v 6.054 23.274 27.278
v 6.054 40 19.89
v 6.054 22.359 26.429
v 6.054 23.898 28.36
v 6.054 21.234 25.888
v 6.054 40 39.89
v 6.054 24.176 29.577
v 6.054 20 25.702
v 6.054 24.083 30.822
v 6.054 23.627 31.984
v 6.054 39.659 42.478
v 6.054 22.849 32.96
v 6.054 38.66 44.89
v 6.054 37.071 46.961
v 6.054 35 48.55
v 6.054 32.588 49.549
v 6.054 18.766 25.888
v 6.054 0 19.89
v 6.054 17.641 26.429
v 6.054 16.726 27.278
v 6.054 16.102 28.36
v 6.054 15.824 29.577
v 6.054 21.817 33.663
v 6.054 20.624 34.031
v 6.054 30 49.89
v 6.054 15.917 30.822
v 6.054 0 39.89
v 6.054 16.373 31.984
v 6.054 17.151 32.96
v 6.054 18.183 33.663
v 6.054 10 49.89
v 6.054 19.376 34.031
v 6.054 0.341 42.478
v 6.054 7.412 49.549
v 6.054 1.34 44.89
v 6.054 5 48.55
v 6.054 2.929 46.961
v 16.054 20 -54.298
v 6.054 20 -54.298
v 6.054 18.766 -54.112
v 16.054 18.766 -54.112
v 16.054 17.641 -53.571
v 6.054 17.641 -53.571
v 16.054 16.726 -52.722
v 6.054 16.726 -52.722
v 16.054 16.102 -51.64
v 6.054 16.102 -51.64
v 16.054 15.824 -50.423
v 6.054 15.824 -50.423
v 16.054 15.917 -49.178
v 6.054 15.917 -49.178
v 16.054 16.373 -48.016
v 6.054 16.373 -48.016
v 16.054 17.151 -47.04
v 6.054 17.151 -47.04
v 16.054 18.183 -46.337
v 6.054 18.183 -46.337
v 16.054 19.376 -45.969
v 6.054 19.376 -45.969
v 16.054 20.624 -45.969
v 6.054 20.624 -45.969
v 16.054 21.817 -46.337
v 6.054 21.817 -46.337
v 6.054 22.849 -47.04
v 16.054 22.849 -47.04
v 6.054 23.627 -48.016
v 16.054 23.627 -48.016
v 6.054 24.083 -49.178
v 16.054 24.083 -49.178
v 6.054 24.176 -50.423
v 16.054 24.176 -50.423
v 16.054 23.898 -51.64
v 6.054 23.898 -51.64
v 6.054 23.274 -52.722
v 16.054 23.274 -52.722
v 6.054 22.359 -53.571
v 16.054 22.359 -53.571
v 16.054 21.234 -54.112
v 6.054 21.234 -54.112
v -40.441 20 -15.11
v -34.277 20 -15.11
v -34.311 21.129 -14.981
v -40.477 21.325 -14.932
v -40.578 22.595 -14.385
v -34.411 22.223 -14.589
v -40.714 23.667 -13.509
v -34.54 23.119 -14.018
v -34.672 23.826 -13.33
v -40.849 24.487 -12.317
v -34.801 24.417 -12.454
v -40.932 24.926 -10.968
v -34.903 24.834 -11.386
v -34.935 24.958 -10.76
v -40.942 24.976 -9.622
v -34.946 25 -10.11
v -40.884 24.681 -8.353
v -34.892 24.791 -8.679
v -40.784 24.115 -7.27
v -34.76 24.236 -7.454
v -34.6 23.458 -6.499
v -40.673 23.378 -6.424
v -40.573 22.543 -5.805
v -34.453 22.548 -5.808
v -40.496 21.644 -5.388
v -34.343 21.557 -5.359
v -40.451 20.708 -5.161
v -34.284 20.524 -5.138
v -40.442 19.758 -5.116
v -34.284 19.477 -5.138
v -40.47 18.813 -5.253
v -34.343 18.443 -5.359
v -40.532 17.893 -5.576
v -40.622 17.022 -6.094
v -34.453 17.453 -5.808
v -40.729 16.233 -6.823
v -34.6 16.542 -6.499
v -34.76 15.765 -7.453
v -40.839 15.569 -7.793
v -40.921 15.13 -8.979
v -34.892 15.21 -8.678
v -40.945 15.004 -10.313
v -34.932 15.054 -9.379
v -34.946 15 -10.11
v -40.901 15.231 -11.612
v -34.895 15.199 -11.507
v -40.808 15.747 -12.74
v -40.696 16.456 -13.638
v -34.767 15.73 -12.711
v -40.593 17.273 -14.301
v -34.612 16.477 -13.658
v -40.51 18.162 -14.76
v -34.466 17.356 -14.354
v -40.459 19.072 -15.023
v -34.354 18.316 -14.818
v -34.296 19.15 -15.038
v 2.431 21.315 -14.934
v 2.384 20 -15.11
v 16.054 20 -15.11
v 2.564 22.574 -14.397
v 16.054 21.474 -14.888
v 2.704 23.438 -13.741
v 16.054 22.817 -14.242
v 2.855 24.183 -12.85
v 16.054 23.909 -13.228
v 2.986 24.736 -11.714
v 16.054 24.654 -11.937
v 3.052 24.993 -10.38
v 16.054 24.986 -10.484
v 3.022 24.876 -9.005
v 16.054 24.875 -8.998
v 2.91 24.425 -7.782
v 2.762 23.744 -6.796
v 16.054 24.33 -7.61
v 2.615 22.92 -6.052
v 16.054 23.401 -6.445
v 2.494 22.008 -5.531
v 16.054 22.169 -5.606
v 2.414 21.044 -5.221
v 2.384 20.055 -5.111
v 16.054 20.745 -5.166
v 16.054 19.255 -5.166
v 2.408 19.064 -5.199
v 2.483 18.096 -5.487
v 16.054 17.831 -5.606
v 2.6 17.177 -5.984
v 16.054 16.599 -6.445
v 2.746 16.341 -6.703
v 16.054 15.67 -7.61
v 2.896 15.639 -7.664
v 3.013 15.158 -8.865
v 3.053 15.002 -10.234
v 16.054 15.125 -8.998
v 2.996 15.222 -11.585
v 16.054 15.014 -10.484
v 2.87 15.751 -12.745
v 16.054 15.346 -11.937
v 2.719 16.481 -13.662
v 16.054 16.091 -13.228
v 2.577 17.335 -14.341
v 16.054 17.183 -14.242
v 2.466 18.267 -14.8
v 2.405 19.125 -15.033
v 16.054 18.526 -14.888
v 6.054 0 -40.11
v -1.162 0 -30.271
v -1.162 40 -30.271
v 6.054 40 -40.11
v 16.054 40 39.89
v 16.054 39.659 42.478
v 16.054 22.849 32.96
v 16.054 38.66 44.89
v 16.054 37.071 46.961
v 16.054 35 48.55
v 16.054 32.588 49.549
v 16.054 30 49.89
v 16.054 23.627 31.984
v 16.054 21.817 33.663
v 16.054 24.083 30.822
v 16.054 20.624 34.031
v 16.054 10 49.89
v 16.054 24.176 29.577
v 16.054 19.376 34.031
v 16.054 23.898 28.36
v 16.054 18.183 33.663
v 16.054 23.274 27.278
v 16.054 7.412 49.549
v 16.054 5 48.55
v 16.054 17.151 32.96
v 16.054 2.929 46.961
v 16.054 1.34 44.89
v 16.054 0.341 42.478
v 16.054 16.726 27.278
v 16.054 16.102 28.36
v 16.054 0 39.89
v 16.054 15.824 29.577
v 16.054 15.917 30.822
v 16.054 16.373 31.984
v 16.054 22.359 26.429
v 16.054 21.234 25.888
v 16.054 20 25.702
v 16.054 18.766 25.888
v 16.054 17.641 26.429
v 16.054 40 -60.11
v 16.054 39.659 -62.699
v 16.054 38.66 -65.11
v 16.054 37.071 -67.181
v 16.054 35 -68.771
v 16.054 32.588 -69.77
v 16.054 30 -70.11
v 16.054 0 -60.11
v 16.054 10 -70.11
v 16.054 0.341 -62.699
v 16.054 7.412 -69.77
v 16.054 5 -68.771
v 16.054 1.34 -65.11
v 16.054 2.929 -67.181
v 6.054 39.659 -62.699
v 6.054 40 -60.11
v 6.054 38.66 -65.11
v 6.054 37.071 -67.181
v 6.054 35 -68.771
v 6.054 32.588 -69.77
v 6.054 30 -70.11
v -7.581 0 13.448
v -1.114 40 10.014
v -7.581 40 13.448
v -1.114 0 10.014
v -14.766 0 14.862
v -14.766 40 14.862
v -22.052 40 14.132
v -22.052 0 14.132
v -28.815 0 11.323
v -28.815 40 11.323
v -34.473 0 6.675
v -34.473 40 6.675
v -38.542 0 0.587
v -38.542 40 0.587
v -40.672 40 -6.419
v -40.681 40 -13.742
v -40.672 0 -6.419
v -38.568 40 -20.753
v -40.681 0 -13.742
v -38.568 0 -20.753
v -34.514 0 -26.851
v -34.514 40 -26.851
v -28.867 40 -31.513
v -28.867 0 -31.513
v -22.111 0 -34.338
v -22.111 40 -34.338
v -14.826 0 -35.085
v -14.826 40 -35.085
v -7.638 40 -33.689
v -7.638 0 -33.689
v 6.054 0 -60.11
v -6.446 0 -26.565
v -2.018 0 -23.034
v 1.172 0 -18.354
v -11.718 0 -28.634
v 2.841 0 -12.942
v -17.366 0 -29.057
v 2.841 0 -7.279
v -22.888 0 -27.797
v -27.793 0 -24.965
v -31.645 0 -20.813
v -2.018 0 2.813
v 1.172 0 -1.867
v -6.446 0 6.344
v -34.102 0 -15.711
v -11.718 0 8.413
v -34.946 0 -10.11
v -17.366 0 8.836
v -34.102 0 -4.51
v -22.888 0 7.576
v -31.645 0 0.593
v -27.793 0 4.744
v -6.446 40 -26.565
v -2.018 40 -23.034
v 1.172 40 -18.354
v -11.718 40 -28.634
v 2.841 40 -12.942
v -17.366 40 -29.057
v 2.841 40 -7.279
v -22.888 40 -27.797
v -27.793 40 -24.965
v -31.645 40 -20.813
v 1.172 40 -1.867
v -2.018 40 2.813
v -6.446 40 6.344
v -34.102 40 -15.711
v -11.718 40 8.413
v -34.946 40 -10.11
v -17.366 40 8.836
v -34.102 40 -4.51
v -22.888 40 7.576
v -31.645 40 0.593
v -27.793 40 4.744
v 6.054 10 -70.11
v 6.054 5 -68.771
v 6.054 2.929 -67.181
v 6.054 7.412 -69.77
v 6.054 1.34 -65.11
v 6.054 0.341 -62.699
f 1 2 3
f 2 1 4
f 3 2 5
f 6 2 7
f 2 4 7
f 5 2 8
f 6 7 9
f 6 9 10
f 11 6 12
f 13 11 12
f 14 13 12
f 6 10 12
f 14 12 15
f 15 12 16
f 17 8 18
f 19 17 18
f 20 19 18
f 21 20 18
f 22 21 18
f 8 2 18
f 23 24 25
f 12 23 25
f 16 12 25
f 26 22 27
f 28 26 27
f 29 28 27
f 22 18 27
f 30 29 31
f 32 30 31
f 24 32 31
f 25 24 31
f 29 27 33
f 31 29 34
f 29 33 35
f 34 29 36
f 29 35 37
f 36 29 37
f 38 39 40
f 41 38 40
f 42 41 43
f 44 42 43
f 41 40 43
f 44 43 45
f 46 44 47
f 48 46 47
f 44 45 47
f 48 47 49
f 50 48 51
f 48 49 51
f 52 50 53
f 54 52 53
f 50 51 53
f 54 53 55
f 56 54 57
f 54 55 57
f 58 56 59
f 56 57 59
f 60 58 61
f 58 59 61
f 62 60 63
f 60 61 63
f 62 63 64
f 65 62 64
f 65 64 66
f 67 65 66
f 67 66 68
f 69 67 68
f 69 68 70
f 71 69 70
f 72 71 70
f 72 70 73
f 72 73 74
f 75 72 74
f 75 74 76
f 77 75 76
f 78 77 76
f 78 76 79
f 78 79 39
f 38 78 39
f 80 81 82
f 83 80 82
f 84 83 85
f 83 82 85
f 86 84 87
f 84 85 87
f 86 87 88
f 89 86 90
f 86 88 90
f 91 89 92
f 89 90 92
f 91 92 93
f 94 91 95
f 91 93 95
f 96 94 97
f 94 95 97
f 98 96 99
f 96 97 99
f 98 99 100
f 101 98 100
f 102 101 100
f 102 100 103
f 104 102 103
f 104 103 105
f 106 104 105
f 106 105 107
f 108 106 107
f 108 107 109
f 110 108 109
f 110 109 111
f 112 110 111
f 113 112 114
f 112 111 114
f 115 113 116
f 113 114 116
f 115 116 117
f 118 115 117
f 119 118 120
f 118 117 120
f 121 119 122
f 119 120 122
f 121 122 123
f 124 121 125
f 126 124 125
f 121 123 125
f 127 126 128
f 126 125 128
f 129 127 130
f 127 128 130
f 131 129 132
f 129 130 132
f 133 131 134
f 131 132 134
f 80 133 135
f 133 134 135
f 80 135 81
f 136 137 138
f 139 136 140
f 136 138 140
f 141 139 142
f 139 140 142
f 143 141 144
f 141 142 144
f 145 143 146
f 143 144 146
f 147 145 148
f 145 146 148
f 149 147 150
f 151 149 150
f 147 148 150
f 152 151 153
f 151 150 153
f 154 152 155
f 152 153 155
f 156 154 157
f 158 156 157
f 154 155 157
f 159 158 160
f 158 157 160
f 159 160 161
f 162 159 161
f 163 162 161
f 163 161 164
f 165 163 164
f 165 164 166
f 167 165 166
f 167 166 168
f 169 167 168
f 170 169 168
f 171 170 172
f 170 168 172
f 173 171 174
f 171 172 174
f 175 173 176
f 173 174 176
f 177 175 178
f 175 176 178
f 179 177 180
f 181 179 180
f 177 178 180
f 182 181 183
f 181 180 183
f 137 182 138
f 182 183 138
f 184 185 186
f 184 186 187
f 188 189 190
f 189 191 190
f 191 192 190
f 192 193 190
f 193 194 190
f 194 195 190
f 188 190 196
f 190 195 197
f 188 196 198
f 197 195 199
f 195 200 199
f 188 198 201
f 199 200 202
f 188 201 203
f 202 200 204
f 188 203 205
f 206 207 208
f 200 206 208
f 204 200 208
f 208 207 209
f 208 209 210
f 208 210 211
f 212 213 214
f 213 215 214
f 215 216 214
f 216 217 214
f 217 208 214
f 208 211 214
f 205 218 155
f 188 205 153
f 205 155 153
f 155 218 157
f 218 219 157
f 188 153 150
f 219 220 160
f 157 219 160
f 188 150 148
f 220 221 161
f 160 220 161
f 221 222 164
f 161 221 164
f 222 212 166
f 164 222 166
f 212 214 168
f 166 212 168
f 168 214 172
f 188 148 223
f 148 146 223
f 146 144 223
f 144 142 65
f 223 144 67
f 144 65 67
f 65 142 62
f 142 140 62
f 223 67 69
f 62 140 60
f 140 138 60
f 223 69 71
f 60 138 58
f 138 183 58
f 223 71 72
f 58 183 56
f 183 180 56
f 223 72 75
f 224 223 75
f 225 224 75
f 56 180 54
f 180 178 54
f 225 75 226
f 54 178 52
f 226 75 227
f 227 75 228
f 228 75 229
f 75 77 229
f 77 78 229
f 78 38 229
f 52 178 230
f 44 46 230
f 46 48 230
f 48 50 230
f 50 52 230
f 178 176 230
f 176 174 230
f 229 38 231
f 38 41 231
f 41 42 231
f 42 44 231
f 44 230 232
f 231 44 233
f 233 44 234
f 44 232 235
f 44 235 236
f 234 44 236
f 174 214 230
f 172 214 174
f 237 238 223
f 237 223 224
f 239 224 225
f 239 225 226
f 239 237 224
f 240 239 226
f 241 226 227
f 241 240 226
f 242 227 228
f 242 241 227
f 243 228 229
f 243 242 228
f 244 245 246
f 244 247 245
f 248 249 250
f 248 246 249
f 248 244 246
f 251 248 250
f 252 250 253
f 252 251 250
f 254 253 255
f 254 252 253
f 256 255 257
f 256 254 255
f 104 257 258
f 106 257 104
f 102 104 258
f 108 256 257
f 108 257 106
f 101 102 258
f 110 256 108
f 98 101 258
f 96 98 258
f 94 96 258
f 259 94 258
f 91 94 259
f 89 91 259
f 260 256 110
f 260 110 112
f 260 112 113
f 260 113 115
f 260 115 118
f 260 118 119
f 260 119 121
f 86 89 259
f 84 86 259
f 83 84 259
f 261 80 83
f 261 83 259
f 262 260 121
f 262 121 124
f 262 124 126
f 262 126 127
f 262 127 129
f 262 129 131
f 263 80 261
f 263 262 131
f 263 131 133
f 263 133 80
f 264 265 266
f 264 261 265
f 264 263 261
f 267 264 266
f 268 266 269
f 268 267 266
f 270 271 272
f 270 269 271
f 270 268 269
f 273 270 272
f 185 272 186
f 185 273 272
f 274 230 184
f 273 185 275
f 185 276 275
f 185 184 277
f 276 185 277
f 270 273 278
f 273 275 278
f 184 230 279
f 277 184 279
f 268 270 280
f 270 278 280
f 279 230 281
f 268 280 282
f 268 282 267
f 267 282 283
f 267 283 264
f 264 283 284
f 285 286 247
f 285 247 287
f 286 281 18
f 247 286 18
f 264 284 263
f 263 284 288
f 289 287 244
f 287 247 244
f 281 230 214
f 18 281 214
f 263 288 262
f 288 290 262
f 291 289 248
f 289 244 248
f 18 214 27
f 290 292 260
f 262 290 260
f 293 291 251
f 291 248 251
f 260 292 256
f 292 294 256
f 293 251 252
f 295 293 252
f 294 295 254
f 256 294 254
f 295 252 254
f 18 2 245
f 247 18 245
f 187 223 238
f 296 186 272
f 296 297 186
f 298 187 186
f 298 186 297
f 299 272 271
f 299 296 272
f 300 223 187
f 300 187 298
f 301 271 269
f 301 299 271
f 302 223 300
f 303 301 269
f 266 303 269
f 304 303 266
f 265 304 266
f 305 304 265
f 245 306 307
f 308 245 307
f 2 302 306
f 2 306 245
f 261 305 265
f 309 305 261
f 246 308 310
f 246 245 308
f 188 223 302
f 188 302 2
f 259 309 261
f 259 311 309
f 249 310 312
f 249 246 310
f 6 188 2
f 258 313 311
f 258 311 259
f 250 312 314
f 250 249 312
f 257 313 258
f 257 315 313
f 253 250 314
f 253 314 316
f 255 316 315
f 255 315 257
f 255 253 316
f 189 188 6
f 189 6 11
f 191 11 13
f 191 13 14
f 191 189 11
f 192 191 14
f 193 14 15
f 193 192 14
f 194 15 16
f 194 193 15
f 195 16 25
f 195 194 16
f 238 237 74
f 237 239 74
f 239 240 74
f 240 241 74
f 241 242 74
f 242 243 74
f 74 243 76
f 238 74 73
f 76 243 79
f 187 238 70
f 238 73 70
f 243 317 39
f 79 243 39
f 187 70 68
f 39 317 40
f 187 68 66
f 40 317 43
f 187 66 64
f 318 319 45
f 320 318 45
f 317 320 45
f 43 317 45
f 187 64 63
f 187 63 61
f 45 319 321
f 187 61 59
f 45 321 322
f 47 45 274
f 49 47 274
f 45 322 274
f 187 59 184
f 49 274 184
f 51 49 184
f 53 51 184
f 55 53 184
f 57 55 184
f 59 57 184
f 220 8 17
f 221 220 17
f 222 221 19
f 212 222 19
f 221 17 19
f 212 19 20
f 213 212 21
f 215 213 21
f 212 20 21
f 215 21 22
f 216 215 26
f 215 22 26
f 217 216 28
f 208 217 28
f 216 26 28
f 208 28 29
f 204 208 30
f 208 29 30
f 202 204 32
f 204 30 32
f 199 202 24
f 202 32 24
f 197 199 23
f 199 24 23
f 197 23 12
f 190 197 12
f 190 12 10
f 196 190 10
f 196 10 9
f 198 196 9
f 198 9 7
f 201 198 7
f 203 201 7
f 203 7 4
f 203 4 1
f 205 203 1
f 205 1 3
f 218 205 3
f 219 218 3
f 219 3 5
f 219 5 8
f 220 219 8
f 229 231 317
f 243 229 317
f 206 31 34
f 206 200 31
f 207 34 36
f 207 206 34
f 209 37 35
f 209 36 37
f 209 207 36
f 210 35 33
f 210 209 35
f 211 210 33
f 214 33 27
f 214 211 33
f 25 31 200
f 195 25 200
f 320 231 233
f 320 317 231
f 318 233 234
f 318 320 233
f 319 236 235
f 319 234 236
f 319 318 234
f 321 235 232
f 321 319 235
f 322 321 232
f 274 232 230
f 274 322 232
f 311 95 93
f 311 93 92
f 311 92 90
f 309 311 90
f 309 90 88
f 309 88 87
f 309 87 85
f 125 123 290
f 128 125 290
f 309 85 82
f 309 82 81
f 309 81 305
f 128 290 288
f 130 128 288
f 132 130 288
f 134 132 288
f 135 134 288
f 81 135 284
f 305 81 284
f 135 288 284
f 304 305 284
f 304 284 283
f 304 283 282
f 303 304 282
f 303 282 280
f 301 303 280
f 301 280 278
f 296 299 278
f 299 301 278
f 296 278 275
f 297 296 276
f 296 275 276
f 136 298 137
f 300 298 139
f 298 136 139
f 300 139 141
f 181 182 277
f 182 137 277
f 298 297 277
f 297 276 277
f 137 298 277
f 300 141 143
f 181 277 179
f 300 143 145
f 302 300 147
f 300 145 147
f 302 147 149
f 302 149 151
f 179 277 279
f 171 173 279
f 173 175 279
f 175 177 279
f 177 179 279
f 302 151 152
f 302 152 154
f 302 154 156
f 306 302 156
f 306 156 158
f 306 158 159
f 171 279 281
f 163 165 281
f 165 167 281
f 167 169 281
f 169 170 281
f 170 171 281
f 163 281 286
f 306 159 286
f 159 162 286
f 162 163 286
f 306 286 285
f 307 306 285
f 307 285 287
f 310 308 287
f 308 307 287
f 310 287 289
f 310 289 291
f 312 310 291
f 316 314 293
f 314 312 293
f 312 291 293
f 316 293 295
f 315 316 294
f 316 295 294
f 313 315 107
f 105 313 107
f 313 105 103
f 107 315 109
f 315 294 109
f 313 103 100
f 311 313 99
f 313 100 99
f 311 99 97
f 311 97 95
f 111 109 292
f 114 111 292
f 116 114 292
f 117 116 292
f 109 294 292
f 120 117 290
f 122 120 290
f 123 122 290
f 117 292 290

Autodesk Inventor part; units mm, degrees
ref_plane "YZ Plane" through (0, 0, 0) normal (1, 0, 0) x (0, 1, 0)
ref_plane "XZ Plane" through (0, 0, 0) normal (0, 1, 0) x (-1, 0, 0)
ref_plane "XY Plane" through (0, 0, 0) normal (0, 0, 1) x (1, 0, 0)
sketch "Sketch1" plane through (0, 0, 0) normal (0, 1, 0) x (-1, 0, 0)
  arc A0 (1.1623, -30.2706) -> (1.1135, 10.0138) centre (15.9463, -10.1104) ccw
  circle A1 centre (15.9463, -10.1104) radius 19
  line L0 (-9.0537, -10.1104) -> (-6.0537, -10.1104)
  line L1 (-6.0537, -10.1104) -> (-6.0537, 49.8896)
  line L2 (-6.0537, 49.8896) -> (-16.0537, 49.8896)
  line L3 (-16.0537, 49.8896) -> (-16.0537, -70.1104)
  line L4 (-16.0537, -70.1104) -> (-6.0537, -70.1104)
  line L5 (-6.0537, -70.1104) -> (-6.0537, -10.1104)
  line L6 (-6.0537, 19.8896) -> (1.1135, 10.0138)
  line L7 (15.9463, -10.1104) -> (15.8318, -10.2667)
  line L8 (1.1623, -30.2706) -> (-6.0537, -40.1104)
  point P0 (0, 0)
  dimension "d0" = 50
  dimension "d1" = 38
  dimension "d2" = 3
  dimension "d4" = 10
  dimension "d5" = 120
  dimension "d11" = 0
extrude "Extrusion1" add sketch "Sketch1" along normal blind 40
sketch "Sketch2" plane through (16.0537, 0, 49.8896) normal (1, 0, 0) x (0, 0, -1)
  line L0 (0, 0) -> (0, 40) projected
  line L1 (0, 20) -> (120, 20)
  line L2 (120, 0) -> (120, 40) projected
  circle A0 centre (60, 20) radius 5
  circle A1 centre (20, 20) radius 4
  circle A2 centre (100, 20) radius 4
  point P0 (49.8896, 0)
  dimension "d14" = 10
  dimension "d15" = 8
  dimension "d16" = 8
  dimension "d17" = 20
  dimension "d18" = 20
hole "Hole1" at (16.0537, 20, 29.8896) at (16.0537, 20, -50.1104) direction (-1, 0, 0) diameter 8.376 depth 27.3 tip angle 118 thread size "M10x1.5" class "6H" standard "ISO Metric profile"
fillet "Fillet1" radius 10 4 edges at (11.0537, 40, 49.8896) (11.0537, 0, 49.8896) (11.0537, 40, -70.1104) (11.0537, 0, -70.1104)
extrude "Extrusion2" cut sketch "Sketch2" against normal blind 100 contours A0 L1 | L1 A0
properties part number "MANCAL_FIXO"
